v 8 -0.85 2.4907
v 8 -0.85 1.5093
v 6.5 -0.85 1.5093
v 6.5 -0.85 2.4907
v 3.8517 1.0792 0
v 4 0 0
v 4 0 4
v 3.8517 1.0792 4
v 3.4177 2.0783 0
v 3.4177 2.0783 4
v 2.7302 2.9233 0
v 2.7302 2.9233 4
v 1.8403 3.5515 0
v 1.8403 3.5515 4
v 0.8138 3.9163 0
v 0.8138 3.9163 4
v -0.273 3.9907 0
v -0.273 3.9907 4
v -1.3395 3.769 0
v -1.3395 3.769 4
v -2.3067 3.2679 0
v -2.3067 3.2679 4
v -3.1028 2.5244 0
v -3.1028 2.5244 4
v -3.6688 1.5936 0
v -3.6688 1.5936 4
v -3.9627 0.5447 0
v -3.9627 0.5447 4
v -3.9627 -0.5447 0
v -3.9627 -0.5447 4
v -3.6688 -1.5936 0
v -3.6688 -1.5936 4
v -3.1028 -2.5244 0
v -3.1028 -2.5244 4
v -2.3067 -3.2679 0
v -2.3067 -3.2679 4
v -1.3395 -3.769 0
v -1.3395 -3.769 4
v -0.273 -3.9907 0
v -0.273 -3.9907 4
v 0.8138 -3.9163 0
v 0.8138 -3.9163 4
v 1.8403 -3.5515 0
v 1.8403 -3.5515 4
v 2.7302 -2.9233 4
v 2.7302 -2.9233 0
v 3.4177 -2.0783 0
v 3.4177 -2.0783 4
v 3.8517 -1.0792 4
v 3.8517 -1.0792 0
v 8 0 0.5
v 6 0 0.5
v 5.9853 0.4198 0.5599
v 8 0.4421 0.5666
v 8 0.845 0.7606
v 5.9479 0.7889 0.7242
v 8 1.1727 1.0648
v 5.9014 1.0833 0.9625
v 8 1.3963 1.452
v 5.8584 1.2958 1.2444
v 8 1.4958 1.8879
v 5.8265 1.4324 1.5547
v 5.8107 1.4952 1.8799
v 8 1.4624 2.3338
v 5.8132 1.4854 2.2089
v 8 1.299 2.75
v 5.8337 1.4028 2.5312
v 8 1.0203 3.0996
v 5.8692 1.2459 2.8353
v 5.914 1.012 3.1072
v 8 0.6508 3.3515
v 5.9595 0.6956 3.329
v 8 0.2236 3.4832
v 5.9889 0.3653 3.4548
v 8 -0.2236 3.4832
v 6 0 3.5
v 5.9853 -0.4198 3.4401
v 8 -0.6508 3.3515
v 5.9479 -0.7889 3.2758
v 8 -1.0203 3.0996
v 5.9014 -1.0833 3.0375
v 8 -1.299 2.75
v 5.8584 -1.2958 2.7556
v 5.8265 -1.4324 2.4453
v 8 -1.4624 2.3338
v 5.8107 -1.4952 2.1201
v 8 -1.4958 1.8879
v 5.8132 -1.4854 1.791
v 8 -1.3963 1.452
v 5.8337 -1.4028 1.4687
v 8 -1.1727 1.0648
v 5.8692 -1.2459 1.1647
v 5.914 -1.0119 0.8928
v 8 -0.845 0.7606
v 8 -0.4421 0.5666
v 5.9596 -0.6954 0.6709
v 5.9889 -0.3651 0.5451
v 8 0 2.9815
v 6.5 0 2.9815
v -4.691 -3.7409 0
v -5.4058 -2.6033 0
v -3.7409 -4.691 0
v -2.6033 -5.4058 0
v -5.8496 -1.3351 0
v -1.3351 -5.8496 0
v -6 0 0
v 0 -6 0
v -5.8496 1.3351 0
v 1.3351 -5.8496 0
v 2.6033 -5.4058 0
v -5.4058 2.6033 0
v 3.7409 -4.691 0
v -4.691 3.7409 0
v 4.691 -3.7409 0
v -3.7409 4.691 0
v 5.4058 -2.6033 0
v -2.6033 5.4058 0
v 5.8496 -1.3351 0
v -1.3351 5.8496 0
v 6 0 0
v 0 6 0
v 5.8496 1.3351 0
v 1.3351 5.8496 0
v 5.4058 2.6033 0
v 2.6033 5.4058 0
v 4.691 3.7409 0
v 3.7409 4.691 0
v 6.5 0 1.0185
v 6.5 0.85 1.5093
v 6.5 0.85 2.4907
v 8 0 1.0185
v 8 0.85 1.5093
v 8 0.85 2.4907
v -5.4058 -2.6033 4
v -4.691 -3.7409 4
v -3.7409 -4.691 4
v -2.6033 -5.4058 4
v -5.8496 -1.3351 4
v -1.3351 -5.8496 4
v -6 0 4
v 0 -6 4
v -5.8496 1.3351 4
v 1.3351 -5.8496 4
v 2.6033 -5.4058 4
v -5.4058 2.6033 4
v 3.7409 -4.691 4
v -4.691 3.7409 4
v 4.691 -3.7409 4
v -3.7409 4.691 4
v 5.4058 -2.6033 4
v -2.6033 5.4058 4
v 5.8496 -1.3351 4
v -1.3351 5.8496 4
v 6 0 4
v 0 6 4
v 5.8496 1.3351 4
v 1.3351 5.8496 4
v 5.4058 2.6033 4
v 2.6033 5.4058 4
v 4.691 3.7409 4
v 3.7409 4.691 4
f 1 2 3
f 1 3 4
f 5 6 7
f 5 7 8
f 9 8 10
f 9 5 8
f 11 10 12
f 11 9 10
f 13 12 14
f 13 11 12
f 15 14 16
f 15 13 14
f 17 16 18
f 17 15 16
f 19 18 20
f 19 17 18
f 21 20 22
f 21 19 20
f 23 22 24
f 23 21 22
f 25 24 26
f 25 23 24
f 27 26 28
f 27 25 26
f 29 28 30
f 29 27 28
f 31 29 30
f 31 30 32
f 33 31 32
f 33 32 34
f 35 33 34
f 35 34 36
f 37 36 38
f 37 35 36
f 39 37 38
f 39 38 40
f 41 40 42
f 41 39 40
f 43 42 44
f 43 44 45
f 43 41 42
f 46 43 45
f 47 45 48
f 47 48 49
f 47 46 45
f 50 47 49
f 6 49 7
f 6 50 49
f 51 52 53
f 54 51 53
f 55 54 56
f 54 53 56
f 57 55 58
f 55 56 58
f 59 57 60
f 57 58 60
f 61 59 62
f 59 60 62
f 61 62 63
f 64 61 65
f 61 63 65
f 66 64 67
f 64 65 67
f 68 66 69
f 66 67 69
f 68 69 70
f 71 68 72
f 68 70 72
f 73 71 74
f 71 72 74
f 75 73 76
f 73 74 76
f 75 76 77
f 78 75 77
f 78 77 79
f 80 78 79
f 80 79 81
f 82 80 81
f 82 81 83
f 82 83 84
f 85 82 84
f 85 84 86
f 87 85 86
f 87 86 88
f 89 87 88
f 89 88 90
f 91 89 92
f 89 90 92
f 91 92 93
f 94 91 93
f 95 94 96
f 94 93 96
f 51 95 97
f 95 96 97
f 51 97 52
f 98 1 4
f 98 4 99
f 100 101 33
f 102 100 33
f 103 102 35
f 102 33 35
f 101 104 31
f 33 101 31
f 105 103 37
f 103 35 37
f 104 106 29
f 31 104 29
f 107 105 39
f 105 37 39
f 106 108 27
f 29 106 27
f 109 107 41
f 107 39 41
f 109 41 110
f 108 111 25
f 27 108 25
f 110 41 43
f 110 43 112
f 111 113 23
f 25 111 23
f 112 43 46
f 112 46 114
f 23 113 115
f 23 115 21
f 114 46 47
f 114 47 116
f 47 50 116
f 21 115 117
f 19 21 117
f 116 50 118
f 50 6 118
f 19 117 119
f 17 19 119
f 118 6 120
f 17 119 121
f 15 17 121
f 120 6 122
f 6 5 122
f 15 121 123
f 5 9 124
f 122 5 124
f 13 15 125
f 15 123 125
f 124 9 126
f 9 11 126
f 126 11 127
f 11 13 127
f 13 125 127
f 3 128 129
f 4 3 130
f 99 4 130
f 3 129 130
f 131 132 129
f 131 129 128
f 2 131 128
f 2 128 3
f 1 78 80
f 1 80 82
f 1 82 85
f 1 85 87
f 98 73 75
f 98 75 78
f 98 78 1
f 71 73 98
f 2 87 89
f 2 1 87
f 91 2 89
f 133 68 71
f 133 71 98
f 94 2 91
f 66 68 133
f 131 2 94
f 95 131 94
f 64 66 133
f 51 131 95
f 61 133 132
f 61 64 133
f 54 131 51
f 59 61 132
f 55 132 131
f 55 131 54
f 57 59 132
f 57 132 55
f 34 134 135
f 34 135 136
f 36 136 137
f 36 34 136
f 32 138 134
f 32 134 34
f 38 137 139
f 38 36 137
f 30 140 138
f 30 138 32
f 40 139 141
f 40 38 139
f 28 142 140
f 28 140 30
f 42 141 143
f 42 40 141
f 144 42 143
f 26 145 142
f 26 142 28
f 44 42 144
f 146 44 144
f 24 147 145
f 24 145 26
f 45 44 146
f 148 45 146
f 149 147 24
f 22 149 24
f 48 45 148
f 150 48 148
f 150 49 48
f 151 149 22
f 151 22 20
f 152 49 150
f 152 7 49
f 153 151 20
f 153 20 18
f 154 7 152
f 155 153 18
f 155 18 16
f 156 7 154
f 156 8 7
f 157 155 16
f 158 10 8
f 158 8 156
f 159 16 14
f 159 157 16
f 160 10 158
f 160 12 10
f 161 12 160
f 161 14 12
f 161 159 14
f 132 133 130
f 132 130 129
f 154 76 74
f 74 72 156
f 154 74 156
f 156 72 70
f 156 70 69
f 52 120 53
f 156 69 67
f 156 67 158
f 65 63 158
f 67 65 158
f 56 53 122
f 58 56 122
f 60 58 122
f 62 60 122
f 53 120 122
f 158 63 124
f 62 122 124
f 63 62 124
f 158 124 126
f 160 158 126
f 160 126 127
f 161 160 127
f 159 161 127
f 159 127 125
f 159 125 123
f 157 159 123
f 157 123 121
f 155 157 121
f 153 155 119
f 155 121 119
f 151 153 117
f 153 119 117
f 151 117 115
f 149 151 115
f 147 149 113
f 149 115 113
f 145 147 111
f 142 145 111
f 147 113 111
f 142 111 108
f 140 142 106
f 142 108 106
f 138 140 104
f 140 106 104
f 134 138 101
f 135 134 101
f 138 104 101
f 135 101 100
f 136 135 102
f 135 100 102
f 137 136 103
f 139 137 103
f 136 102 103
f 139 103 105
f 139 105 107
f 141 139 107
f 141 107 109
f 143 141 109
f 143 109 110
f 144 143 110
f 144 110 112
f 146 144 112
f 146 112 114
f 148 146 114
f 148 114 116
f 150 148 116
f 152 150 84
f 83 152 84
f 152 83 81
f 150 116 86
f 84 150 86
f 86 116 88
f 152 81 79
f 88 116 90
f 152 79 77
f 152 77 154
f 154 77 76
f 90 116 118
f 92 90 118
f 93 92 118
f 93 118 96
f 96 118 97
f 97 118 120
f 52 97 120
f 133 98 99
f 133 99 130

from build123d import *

# Parameters (mm, degrees)
SKETCH1_R                = 6
SKETCH1_R_2              = 4
BOSS_EXTRUDE1_DEPTH      = 4
BOSS_EXTRUDE2_DEPTH      = 2
BOSS_EXTRUDE2_DEPTH_BACK = 1
SKETCH2_R                = 1.5
CUT_EXTRUDE1_DEPTH       = 1.5


with BuildPart() as part:
    # Sketch1 → Boss-Extrude1 (new body)
    with BuildSketch(Plane.XY):
        Circle(SKETCH1_R)
        Circle(SKETCH1_R_2, mode=Mode.SUBTRACT)
    extrude(amount=BOSS_EXTRUDE1_DEPTH)

    # Sketch2 → Boss-Extrude2 (add, two sides: drawn at the far end of the back side and taken through both)
    with BuildSketch(Plane(origin=(6, 0, 0), x_dir=(0, 0, -1), z_dir=(1, 0, 0)).offset(-BOSS_EXTRUDE2_DEPTH_BACK)):
        with Locations((-2, 0)):
            Circle(SKETCH2_R)
    extrude(amount=BOSS_EXTRUDE2_DEPTH + BOSS_EXTRUDE2_DEPTH_BACK)

    # Sketch3 → Cut-Extrude1 (cut)
    with BuildSketch(Plane(origin=(8, 0, 0), x_dir=(0, 0, -1), z_dir=(1, 0, 0))):
        Polygon((-2.490747729, 0.85), (-1.509252271, 0.85), (-1.018504542, 0), (-1.509252271, -0.85), (-2.490747729, -0.85), (-2.981495458, 0), align=None)
    extrude(amount=-CUT_EXTRUDE1_DEPTH, mode=Mode.SUBTRACT)


solid = part.part
